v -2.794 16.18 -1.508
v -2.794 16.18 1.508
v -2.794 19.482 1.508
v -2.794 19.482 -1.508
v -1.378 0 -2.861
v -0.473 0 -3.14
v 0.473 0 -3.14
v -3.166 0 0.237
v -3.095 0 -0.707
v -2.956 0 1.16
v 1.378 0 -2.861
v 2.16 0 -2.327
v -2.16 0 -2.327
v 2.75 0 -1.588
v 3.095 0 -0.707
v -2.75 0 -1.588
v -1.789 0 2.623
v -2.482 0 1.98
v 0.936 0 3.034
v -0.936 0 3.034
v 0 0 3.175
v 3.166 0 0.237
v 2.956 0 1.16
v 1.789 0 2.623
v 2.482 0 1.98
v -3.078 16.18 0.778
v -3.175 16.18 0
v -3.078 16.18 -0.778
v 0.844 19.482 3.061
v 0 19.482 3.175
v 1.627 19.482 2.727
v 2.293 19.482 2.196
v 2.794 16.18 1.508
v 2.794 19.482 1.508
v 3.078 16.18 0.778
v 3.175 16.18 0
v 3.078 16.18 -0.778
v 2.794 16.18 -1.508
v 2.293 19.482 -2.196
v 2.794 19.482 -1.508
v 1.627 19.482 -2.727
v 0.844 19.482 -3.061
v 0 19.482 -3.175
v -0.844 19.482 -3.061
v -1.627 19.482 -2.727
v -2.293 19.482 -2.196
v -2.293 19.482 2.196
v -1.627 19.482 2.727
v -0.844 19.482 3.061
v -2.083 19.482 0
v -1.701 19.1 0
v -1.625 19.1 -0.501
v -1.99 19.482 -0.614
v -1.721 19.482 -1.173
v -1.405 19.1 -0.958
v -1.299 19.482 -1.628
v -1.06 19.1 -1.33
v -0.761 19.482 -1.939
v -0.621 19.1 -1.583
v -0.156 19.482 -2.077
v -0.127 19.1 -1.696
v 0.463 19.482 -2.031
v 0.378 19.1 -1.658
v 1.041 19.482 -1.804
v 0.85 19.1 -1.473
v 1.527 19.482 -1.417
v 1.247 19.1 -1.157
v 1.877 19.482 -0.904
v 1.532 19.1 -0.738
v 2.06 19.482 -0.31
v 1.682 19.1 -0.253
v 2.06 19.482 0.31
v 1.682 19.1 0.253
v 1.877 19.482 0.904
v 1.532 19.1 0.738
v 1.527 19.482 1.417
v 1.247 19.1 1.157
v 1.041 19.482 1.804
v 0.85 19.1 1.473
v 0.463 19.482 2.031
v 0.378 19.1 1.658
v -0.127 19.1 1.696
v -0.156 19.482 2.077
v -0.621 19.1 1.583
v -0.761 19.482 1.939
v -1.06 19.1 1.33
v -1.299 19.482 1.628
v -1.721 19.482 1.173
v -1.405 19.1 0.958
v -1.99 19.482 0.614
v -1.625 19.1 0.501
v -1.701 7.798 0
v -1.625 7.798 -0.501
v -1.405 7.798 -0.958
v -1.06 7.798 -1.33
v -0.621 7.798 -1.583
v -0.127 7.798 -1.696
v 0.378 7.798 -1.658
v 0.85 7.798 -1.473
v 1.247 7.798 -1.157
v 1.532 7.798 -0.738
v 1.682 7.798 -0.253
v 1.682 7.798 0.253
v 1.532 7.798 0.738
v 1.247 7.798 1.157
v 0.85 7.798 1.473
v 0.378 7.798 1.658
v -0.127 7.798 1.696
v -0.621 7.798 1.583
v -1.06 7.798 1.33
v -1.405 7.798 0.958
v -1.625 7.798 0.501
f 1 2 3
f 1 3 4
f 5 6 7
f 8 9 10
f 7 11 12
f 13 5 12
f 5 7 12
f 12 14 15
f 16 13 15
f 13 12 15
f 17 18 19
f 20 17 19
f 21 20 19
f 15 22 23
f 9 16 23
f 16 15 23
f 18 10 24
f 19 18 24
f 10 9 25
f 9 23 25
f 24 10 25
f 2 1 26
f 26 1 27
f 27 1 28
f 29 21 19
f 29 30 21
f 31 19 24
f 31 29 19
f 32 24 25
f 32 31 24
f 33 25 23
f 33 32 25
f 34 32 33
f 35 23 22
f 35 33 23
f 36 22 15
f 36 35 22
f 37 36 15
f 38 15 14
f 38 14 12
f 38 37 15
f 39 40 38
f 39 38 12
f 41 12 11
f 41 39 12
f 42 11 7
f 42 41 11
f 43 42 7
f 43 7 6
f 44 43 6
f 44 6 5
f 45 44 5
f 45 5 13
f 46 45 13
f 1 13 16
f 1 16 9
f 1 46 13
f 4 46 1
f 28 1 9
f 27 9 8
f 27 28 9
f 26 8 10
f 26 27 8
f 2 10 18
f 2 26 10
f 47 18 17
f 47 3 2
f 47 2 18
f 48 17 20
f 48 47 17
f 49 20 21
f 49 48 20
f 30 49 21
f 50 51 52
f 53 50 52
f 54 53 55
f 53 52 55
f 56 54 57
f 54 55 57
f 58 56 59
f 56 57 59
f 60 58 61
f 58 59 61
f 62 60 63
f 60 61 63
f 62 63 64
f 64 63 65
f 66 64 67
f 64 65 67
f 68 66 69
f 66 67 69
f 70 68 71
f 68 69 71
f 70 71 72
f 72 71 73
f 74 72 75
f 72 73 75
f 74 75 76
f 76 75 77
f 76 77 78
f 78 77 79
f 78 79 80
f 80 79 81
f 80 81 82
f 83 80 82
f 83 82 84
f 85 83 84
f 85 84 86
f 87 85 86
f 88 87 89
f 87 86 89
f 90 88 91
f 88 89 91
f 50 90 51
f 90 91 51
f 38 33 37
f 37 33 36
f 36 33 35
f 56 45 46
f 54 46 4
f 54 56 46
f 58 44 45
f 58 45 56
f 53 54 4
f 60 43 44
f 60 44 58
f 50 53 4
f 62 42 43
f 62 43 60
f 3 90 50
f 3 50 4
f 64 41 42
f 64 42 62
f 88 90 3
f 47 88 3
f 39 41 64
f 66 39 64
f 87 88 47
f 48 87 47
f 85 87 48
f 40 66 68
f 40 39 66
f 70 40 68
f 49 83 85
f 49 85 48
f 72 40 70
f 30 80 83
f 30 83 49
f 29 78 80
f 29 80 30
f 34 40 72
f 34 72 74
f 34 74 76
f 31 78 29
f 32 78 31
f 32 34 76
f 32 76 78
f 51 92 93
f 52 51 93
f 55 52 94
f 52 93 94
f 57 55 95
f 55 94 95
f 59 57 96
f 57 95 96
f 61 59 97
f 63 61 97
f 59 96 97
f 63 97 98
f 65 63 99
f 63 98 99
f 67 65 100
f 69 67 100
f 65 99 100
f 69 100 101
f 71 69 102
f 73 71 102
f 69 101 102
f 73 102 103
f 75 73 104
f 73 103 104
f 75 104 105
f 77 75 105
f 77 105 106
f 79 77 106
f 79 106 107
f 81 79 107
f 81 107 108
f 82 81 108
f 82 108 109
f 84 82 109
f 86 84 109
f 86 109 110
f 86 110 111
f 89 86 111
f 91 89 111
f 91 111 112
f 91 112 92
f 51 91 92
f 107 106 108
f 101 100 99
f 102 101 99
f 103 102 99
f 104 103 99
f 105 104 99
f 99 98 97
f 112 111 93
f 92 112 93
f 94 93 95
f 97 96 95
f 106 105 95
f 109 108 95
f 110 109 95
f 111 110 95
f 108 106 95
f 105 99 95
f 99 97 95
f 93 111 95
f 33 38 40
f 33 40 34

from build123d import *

# Parameters (mm, degrees)
SKETCH1_W                = 3.175
SKETCH1_H                = 19.4818
CUT_EXTRUDE1_START       = -3.302
CUT_EXTRUDE1_DEPTH       = 3.302
CUT_EXTRUDE2_START       = -3.302
CUT_EXTRUDE2_DEPTH       = 3.302
M3_CLEARANCE_HOLE1_D     = 3.40106
M3_CLEARANCE_HOLE1_DEPTH = 11.684
CHAMFER1_SIZE            = 0.38227


with BuildPart() as part:
    # Sketch1 → Revolve1 (revolve)
    with BuildSketch(Plane(origin=(0, 0, 0), x_dir=(-1, 0, 0), z_dir=(0, 0, -1)), mode=Mode.PRIVATE) as revolve1_sk:
        with Locations((-1.5875, 9.7409)):
            Rectangle(SKETCH1_W, SKETCH1_H)
    revolve(revolve1_sk.sketch.rotate(Axis((0, 0, 0), (0, 1, 0)), 270), axis=Axis((0, 0, 0), (0, 1, 0)))

    # Sketch2 → Cut-Extrude1 (cut)
    with BuildSketch(Plane(origin=(0, 19.4818, 0), x_dir=(-1, 0, 0), z_dir=(0, 1, 0)).offset(CUT_EXTRUDE1_START)):
        with BuildLine():
            Line((2.794, 1.508041445), (2.794, -1.508041445))
            ThreePointArc((2.794, -1.508041445), (3.175, 0), (2.794, 1.508041445))
        make_face()
    extrude(amount=CUT_EXTRUDE1_DEPTH, mode=Mode.SUBTRACT)

    # Sketch3 → Cut-Extrude2 (cut)
    with BuildSketch(Plane(origin=(0, 19.4818, 0), x_dir=(-1, 0, 0), z_dir=(0, 1, 0)).offset(CUT_EXTRUDE2_START)):
        with BuildLine():
            Line((-2.794, -1.508041445), (-2.794, 1.508041445))
            ThreePointArc((-2.794, 1.508041445), (-3.175, 0), (-2.794, -1.508041445))
        make_face()
    extrude(amount=CUT_EXTRUDE2_DEPTH, mode=Mode.SUBTRACT)

    # M3 Clearance Hole1
    with Locations(Plane(origin=(0, 19.4818, 0), x_dir=(1, 0, 0), z_dir=(0, 1, 0))):
        with Locations((0, 0)):
            Hole(M3_CLEARANCE_HOLE1_D / 2, depth=M3_CLEARANCE_HOLE1_DEPTH)

    # Chamfer1
    chamfer1_edges = [part.edges().sort_by_distance(p)[0] for p in [
        (1.70053, 19.4818, 0),
    ]]
    chamfer(chamfer1_edges, length=CHAMFER1_SIZE)


solid = part.part
